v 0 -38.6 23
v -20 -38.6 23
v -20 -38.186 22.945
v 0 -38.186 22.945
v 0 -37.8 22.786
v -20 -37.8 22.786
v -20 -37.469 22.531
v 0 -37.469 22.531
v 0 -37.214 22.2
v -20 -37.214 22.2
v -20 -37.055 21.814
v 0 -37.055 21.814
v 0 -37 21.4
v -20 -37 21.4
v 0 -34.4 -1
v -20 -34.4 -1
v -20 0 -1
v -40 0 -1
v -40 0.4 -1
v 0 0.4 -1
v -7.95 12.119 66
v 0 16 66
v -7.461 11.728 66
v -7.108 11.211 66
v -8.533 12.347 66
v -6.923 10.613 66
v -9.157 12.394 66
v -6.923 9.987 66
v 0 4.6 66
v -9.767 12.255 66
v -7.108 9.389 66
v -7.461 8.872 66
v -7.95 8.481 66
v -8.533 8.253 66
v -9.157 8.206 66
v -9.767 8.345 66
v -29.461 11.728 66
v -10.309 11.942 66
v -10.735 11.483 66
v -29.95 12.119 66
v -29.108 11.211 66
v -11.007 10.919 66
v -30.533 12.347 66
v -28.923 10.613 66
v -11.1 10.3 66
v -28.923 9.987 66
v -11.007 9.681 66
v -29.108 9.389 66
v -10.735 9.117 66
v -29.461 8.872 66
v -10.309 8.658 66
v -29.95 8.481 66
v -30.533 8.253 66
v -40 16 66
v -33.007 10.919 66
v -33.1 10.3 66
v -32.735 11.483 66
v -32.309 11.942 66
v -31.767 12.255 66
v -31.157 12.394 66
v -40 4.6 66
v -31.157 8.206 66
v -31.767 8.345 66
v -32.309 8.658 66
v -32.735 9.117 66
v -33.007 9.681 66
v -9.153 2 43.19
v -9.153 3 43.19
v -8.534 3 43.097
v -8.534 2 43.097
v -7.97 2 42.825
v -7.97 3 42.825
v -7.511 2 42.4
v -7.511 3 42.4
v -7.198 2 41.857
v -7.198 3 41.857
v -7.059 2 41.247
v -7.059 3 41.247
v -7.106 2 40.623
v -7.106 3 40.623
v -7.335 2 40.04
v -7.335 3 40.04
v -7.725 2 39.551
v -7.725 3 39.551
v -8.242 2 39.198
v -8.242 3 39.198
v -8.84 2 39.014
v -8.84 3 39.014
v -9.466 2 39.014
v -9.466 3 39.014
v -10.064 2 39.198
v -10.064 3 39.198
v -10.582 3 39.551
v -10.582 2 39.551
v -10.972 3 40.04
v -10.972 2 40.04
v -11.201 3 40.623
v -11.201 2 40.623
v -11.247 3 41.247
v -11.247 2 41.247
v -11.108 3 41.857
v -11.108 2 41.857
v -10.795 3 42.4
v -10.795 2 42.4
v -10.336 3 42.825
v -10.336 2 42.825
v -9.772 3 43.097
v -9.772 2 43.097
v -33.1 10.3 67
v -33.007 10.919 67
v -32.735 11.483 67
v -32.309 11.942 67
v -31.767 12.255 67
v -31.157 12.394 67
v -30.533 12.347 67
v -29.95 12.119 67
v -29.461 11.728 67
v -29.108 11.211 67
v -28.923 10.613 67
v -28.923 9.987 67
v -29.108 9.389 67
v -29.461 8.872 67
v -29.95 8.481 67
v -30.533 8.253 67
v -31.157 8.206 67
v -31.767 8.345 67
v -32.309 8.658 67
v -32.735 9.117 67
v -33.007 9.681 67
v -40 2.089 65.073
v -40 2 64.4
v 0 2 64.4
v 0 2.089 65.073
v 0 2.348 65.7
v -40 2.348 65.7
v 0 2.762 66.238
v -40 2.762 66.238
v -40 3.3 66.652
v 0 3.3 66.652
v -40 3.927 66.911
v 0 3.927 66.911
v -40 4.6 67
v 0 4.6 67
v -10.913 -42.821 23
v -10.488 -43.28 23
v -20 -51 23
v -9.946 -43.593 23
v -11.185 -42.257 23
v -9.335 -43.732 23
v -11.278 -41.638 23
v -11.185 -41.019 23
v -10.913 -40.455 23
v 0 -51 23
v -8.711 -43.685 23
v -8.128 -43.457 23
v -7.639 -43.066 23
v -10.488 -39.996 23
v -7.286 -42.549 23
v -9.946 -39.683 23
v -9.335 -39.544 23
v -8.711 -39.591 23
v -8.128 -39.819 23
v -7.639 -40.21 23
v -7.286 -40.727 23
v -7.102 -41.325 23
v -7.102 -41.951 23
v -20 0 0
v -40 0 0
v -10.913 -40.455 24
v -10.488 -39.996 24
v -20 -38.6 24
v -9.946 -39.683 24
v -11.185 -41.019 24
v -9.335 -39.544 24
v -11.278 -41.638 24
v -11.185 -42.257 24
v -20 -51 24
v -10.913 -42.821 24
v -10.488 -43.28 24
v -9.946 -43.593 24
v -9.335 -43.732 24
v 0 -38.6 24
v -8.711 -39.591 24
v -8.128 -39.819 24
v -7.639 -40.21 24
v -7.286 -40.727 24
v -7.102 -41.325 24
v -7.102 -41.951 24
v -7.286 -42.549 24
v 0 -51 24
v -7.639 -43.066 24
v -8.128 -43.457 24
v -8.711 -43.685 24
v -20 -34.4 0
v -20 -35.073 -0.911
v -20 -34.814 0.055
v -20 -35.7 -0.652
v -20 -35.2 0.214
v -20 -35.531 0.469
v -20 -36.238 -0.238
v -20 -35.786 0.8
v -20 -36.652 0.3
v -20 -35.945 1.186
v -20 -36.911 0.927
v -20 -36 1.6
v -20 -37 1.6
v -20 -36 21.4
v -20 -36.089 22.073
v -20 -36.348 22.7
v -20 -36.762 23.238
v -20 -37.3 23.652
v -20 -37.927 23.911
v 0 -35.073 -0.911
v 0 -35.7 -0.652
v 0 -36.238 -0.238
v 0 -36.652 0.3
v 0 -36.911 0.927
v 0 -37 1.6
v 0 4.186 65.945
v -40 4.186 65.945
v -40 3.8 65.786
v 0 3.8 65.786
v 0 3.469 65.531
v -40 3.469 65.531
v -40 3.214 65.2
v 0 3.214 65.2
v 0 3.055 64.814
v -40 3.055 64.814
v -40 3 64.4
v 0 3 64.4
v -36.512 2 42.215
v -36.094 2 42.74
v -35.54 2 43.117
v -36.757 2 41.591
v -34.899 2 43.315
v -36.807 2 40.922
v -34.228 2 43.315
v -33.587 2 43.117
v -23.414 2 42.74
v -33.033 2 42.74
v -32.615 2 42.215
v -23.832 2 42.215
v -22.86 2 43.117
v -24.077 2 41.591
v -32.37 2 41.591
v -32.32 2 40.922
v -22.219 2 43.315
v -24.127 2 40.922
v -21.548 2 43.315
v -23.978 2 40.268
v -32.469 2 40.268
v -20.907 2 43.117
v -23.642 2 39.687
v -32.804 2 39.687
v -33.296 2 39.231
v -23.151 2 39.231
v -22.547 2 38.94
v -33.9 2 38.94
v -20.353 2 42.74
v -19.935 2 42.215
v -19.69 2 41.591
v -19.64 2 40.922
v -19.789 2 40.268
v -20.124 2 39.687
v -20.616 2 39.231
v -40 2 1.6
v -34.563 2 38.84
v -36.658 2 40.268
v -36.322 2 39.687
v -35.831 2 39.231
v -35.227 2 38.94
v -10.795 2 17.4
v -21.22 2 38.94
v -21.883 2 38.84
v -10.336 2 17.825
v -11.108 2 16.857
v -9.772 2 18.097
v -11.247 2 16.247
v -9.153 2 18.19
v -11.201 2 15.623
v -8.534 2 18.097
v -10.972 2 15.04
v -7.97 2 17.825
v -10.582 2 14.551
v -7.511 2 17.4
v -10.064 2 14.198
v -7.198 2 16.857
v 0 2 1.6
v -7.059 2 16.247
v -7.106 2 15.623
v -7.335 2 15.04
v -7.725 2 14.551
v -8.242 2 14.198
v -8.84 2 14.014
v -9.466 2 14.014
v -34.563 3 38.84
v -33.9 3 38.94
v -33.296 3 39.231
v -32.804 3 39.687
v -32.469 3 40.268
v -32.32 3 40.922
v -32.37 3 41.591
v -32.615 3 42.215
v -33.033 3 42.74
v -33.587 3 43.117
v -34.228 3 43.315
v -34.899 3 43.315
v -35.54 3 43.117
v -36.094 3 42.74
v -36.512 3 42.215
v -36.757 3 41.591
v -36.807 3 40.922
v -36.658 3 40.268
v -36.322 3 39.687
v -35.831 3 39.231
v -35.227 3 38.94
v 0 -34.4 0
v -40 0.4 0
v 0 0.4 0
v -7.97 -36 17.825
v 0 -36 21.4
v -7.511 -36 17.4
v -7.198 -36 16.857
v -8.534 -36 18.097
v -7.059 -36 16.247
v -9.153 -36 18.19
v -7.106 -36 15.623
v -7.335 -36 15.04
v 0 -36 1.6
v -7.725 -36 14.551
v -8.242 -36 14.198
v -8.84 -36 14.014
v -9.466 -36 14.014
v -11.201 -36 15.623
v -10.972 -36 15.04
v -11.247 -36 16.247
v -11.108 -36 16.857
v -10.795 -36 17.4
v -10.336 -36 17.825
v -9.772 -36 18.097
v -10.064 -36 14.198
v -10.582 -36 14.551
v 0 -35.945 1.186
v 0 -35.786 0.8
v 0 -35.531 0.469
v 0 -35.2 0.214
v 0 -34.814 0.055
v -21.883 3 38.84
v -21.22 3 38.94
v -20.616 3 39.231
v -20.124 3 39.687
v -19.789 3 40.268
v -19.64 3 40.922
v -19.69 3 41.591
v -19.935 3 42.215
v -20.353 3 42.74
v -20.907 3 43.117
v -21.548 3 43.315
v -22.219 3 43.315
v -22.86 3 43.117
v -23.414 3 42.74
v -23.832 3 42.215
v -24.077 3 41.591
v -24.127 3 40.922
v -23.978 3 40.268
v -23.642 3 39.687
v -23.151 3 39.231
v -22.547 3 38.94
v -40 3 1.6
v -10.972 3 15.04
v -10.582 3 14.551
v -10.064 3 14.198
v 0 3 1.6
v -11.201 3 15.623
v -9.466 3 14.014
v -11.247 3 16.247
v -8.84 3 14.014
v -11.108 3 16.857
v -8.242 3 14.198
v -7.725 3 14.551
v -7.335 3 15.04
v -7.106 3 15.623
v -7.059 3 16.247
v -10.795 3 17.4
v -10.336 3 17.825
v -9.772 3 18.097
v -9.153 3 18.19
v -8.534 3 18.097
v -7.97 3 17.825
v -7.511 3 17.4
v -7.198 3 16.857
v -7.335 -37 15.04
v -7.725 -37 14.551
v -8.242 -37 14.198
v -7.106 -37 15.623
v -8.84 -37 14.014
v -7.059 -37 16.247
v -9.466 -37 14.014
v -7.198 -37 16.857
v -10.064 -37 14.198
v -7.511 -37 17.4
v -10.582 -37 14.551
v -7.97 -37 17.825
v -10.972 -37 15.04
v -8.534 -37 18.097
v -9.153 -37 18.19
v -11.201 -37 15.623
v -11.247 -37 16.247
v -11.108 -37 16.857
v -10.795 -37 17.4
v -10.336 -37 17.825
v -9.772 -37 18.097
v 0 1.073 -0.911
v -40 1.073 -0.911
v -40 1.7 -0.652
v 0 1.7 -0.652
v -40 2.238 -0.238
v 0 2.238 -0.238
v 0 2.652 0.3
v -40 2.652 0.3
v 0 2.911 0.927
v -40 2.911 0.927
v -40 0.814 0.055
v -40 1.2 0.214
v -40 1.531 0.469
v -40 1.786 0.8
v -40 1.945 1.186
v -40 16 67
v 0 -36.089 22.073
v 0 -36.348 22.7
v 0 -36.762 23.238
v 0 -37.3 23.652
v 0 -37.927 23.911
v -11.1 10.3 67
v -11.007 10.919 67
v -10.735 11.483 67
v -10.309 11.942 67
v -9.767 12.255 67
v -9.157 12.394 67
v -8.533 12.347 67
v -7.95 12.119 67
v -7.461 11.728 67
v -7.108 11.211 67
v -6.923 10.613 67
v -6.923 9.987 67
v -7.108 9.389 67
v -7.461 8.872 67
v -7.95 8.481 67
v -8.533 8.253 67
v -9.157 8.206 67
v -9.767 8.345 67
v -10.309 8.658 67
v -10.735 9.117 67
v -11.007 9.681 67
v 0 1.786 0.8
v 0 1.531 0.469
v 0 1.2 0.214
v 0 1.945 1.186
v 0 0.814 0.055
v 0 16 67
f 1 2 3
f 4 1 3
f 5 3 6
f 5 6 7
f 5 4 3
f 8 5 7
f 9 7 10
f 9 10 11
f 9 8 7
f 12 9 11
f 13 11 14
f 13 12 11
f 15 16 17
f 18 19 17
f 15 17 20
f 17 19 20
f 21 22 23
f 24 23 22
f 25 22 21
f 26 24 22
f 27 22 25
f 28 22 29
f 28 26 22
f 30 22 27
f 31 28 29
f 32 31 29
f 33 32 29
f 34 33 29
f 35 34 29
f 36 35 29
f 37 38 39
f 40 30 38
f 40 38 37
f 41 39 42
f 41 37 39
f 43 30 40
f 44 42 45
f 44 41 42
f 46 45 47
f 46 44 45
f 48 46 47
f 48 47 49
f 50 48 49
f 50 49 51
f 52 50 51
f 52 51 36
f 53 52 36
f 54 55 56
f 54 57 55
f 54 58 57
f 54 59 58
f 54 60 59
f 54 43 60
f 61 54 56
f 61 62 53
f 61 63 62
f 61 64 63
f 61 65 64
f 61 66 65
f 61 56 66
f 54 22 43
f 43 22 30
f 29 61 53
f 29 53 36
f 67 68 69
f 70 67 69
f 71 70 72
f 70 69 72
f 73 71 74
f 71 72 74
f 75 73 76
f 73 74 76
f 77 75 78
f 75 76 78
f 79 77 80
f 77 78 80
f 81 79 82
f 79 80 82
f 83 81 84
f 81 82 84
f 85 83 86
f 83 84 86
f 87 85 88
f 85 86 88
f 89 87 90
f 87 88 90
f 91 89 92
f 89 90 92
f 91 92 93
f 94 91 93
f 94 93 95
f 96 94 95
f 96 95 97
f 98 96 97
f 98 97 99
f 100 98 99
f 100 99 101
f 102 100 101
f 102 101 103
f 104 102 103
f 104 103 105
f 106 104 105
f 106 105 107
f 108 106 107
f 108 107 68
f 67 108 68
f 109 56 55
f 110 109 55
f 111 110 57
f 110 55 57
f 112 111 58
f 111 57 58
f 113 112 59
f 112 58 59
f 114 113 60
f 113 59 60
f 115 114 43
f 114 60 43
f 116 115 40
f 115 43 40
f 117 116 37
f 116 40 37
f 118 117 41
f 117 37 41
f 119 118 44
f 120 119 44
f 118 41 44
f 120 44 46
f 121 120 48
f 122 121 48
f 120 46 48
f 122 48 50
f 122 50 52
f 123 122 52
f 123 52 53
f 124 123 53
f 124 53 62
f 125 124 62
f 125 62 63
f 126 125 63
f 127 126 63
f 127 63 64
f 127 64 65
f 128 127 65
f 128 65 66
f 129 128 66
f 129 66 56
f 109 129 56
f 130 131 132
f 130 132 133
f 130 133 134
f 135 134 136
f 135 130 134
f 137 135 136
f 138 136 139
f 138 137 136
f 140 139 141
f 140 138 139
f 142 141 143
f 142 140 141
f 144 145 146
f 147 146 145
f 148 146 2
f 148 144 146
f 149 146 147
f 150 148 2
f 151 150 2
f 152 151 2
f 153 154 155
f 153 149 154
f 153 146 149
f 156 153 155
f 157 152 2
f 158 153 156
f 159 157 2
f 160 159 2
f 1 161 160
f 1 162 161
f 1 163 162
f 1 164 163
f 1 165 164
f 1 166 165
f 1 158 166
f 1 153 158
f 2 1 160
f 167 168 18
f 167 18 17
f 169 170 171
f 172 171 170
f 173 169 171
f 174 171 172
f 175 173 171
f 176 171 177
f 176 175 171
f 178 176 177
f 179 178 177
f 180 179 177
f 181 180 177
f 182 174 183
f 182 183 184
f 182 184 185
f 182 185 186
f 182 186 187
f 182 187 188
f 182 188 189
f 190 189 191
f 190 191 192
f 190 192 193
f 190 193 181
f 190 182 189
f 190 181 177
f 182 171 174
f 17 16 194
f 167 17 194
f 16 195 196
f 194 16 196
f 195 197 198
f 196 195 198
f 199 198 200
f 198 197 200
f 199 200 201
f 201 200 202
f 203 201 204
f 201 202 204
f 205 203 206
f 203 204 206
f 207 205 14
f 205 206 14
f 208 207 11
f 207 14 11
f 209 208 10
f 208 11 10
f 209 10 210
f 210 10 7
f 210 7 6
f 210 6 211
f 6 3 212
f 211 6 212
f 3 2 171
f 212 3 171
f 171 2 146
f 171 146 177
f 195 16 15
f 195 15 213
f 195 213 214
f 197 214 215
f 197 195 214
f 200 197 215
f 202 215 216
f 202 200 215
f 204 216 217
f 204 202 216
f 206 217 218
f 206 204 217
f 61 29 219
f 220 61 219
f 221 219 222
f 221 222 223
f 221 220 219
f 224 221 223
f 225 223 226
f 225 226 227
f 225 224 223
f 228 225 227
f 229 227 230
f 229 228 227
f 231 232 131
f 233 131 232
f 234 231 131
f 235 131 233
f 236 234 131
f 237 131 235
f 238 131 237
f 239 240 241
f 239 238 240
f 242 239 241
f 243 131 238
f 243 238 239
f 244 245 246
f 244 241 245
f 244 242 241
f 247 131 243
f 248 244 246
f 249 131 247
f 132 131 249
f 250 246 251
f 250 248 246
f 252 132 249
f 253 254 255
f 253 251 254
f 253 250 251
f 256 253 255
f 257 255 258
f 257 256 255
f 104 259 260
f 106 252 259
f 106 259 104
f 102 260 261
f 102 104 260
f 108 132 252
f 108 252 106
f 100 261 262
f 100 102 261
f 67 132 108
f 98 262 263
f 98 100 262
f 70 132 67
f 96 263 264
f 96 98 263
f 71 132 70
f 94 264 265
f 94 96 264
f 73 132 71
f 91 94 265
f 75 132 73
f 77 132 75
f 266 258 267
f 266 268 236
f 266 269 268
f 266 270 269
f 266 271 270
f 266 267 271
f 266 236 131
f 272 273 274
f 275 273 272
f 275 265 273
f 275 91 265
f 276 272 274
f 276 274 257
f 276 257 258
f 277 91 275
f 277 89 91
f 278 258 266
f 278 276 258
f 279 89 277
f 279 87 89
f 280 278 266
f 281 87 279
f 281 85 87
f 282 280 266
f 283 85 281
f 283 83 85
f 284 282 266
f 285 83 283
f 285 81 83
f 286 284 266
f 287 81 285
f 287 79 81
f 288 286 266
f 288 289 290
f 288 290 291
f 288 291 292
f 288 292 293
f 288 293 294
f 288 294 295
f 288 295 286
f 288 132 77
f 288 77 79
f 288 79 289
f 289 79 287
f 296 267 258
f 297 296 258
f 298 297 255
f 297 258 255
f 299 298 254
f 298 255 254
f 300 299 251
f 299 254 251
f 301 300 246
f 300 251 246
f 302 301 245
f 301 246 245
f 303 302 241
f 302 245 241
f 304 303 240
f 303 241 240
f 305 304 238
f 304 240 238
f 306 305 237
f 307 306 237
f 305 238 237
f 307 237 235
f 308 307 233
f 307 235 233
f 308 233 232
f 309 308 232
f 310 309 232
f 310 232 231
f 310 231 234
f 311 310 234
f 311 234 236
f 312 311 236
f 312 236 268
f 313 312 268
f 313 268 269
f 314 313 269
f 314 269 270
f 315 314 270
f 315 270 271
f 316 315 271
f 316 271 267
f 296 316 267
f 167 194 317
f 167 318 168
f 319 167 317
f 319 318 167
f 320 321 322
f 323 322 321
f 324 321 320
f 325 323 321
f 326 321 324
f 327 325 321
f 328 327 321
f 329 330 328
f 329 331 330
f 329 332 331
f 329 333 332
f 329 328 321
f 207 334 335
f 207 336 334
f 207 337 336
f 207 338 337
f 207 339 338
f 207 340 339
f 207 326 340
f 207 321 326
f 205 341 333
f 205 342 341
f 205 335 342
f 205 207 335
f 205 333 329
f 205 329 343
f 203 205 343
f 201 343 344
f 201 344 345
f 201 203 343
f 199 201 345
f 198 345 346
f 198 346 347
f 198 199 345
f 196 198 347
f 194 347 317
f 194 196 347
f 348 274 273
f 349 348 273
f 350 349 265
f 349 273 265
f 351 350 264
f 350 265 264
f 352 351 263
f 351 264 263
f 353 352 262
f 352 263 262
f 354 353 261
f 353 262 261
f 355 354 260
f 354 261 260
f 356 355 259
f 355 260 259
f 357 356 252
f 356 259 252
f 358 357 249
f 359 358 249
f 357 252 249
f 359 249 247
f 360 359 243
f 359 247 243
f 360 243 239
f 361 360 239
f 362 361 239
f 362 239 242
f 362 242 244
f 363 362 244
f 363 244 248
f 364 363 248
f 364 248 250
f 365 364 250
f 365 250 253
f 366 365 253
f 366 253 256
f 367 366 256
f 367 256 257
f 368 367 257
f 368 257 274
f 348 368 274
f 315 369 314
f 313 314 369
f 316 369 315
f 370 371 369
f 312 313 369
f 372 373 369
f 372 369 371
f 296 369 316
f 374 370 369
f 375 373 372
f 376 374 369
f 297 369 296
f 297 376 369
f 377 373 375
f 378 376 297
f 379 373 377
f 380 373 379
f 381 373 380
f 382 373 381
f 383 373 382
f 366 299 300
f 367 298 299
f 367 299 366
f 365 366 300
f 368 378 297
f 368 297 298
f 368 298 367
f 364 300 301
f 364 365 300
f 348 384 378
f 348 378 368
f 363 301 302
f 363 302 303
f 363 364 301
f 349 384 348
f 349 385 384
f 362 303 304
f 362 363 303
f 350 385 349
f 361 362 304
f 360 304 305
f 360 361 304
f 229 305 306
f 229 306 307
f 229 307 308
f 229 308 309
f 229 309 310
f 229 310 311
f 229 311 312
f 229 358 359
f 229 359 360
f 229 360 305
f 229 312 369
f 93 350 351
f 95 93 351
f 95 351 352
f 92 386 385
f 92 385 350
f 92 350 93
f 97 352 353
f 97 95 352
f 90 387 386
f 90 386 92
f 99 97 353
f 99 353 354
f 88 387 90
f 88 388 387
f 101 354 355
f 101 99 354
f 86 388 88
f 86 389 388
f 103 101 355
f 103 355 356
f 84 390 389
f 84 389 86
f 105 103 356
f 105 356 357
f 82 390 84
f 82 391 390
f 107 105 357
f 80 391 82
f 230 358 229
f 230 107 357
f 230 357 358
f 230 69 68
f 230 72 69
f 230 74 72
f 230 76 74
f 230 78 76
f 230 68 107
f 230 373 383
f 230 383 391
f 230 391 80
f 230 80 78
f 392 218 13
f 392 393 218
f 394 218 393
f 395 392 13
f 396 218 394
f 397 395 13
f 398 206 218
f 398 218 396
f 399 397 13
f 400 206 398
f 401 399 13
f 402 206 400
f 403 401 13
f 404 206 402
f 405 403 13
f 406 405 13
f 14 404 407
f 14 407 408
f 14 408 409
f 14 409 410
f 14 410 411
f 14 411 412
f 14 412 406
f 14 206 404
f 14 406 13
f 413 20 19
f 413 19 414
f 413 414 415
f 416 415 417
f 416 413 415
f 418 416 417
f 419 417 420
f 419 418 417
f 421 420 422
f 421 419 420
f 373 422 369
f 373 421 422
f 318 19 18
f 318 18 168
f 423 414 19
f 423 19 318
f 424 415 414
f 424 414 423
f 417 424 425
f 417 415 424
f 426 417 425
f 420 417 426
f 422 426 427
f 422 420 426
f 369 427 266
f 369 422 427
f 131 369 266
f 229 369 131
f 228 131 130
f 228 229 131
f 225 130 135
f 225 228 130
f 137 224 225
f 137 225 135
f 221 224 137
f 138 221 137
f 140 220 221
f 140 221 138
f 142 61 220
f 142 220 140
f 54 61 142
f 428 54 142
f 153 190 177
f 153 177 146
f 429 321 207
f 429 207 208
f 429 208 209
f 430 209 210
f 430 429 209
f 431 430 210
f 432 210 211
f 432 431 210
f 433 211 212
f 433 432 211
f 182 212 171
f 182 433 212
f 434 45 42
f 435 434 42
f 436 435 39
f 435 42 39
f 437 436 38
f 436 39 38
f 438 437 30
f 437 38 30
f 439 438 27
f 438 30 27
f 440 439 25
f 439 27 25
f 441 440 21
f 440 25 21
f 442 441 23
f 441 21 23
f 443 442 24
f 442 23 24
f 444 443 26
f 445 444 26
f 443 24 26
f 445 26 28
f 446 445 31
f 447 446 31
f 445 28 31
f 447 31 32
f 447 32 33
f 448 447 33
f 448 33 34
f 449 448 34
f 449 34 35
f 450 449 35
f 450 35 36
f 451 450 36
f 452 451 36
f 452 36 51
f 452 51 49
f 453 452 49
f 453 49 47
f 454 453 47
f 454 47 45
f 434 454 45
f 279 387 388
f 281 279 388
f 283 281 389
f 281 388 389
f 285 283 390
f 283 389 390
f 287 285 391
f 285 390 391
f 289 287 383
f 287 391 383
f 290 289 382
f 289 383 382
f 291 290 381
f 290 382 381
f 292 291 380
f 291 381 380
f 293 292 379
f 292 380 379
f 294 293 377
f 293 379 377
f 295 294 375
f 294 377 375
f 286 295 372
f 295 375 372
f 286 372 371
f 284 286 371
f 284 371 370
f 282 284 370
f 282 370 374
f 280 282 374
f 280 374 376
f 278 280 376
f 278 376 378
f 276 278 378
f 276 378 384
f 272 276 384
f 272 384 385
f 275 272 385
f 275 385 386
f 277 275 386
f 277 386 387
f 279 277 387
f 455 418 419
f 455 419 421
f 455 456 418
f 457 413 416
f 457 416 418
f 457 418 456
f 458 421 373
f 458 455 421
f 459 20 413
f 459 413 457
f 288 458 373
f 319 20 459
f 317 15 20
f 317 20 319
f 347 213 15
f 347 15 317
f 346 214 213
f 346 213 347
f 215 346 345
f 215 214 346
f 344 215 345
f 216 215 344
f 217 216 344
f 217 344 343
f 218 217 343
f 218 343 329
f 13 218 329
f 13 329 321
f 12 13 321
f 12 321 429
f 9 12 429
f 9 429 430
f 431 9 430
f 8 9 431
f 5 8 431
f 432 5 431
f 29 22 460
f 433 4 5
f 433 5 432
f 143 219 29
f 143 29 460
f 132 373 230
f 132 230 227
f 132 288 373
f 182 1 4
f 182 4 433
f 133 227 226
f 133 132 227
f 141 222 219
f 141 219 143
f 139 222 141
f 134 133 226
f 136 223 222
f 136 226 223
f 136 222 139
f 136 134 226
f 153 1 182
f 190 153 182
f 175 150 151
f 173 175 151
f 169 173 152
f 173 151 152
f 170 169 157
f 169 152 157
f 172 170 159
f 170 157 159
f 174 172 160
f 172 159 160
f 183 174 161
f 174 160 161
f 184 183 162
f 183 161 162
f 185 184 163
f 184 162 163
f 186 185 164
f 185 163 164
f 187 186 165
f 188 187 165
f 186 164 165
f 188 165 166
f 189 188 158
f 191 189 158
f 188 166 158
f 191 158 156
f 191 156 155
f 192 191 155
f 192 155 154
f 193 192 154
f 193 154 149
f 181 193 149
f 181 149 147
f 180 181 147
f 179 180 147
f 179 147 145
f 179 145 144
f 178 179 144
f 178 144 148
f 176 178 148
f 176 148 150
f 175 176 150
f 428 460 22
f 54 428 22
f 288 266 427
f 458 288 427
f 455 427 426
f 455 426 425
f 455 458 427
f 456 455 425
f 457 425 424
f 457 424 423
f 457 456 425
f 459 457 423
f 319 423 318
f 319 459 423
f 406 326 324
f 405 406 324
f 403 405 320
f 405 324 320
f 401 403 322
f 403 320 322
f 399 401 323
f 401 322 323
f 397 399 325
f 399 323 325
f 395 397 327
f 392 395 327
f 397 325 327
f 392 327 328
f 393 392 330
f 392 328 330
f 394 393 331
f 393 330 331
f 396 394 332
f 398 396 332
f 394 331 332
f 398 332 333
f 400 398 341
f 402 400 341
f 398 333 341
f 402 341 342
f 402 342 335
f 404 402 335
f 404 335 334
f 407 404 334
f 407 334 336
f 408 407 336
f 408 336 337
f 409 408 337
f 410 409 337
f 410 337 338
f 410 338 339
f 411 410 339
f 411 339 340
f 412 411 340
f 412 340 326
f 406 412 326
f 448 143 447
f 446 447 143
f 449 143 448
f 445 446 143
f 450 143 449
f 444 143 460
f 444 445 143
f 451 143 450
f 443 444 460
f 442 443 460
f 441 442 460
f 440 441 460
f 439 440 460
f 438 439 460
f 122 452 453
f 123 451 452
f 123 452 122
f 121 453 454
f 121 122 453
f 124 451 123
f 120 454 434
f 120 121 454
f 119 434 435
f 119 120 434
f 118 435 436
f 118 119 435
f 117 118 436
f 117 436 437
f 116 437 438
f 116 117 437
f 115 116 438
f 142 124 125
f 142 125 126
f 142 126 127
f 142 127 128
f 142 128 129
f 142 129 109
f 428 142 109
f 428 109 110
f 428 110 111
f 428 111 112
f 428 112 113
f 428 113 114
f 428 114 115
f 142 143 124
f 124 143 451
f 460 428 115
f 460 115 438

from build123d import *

# Parameters (mm, degrees)
BASE_FLANGE1_DEPTH           = 1
EDGE_FLANGE1_STRIP_W         = 7.2
EDGE_FLANGE1_STRIP_H         = 1
EDGE_FLANGE1_STRIP_CUT_DEPTH = 40
EDGE_FLANGE1_DEPTH           = 40
EDGE_FLANGE2_STRIP_W         = 7.2
EDGE_FLANGE2_STRIP_H         = 1
EDGE_FLANGE2_STRIP_CUT_DEPTH = 40
EDGE_FLANGE2_DEPTH           = 40
EDGE_FLANGE3_STRIP_W         = 7.2
EDGE_FLANGE3_STRIP_H         = 1
EDGE_FLANGE3_STRIP_CUT_DEPTH = 20
EDGE_FLANGE3_DEPTH           = 20
EDGE_FLANGE4_STRIP_W         = 7.2
EDGE_FLANGE4_STRIP_H         = 1
EDGE_FLANGE4_STRIP_CUT_DEPTH = 20
EDGE_FLANGE4_DEPTH           = 20
SKETCH18_R                   = 2.1
CUT_EXTRUDE1_DEPTH           = 6
SKETCH19_R                   = 2.1
CUT_EXTRUDE2_DEPTH           = 6
SKETCH20_R                   = 2.1
CUT_EXTRUDE3_DEPTH           = 50
SKETCH21_R                   = 2.25
CUT_EXTRUDE4_DEPTH           = 50


# Sheet-metal steps are written as plain solids
with BuildPart() as part:
    # Sketch1 → Base-Flange1 (new body)
    with BuildSketch(Plane.XY):
        Polygon((0, 0), (0, 3), (-40, 3), (-40, 0), (-20, 0), (-20, -37), (-18.16511543, -37), (0, -37), align=None)
    extrude(amount=-BASE_FLANGE1_DEPTH)

    # Edge-Flange1 strip (across the edge) → Edge-Flange1 strip cut (cut)
    with BuildSketch(Plane(origin=(0, 3, 0), x_dir=(0, -1, 0), z_dir=(-1, 0, 0))):
        with Locations((-1, -0.5)):
            Rectangle(EDGE_FLANGE1_STRIP_W, EDGE_FLANGE1_STRIP_H)
    extrude(amount=EDGE_FLANGE1_STRIP_CUT_DEPTH, mode=Mode.SUBTRACT)

    # Edge-Flange1 section (across the edge) → Edge-Flange1 (add)
    with BuildSketch(Plane(origin=(0, 3, 0), x_dir=(0, -1, 0), z_dir=(-1, 0, 0))):
        with BuildLine():
            Line((0, 1.6), (0, 67))
            Line((0, 67), (1, 67))
            Line((1, 67), (1, 1.6))
            ThreePointArc((1, 1.6), (1.46862915, 0.46862915), (2.6, 0))
            Line((2.6, 0), (2.6, -1))
            ThreePointArc((2.6, -1), (0.761522369, -0.238477631), (0, 1.6))
        make_face()
    extrude(amount=EDGE_FLANGE1_DEPTH)

    # Edge-Flange2 strip (across the edge) → Edge-Flange2 strip cut (cut)
    with BuildSketch(Plane(origin=(-40, 3, 67), x_dir=(0, 0, -1), z_dir=(1, 0, 0))):
        with Locations((-1, -0.5)):
            Rectangle(EDGE_FLANGE2_STRIP_W, EDGE_FLANGE2_STRIP_H)
    extrude(amount=EDGE_FLANGE2_STRIP_CUT_DEPTH, mode=Mode.SUBTRACT)

    # Edge-Flange2 section (across the edge) → Edge-Flange2 (add)
    with BuildSketch(Plane(origin=(-40, 3, 67), x_dir=(0, 0, -1), z_dir=(1, 0, 0))):
        with BuildLine():
            Line((0, 1.6), (0, 13))
            Line((0, 13), (1, 13))
            Line((1, 13), (1, 1.6))
            ThreePointArc((1, 1.6), (1.46862915, 0.46862915), (2.6, 0))
            Line((2.6, 0), (2.6, -1))
            ThreePointArc((2.6, -1), (0.761522369, -0.238477631), (0, 1.6))
        make_face()
    extrude(amount=EDGE_FLANGE2_DEPTH)

    # Edge-Flange3 strip (across the edge) → Edge-Flange3 strip cut (cut)
    with BuildSketch(Plane(origin=(-20, -37, 0), x_dir=(0, 1, 0), z_dir=(1, 0, 0))):
        with Locations((-1, -0.5)):
            Rectangle(EDGE_FLANGE3_STRIP_W, EDGE_FLANGE3_STRIP_H)
    extrude(amount=EDGE_FLANGE3_STRIP_CUT_DEPTH, mode=Mode.SUBTRACT)

    # Edge-Flange3 section (across the edge) → Edge-Flange3 (add)
    with BuildSketch(Plane(origin=(-20, -37, 0), x_dir=(0, 1, 0), z_dir=(1, 0, 0))):
        with BuildLine():
            Line((0, 1.6), (0, 24))
            Line((0, 24), (1, 24))
            Line((1, 24), (1, 1.6))
            ThreePointArc((1, 1.6), (1.46862915, 0.46862915), (2.6, 0))
            Line((2.6, 0), (2.6, -1))
            ThreePointArc((2.6, -1), (0.761522369, -0.238477631), (0, 1.6))
        make_face()
    extrude(amount=EDGE_FLANGE3_DEPTH)

    # Edge-Flange4 strip (across the edge) → Edge-Flange4 strip cut (cut)
    with BuildSketch(Plane(origin=(0, -37, 24), x_dir=(0, 0, -1), z_dir=(-1, 0, 0))):
        with Locations((-1, -0.5)):
            Rectangle(EDGE_FLANGE4_STRIP_W, EDGE_FLANGE4_STRIP_H)
    extrude(amount=EDGE_FLANGE4_STRIP_CUT_DEPTH, mode=Mode.SUBTRACT)

    # Edge-Flange4 section (across the edge) → Edge-Flange4 (add)
    with BuildSketch(Plane(origin=(0, -37, 24), x_dir=(0, 0, -1), z_dir=(-1, 0, 0))):
        with BuildLine():
            Line((0, 1.6), (0, 14))
            Line((0, 14), (1, 14))
            Line((1, 14), (1, 1.6))
            ThreePointArc((1, 1.6), (1.46862915, 0.46862915), (2.6, 0))
            Line((2.6, 0), (2.6, -1))
            ThreePointArc((2.6, -1), (0.761522369, -0.238477631), (0, 1.6))
        make_face()
    extrude(amount=EDGE_FLANGE4_DEPTH)

    # Sketch18 → Cut-Extrude1 (cut)
    with BuildSketch(Plane(origin=(0, 0, 66), x_dir=(-1, 0, 0), z_dir=(0, 0, -1))):
        with Locations((9, 10.3)):
            Circle(SKETCH18_R)
        with Locations((31, 10.3)):
            Circle(SKETCH18_R)
    extrude(amount=-CUT_EXTRUDE1_DEPTH, mode=Mode.SUBTRACT)

    # Sketch19 → Cut-Extrude2 (cut)
    with BuildSketch(Plane(origin=(0, 0, 23), x_dir=(-1, 0, 0), z_dir=(0, 0, -1))):
        with Locations((9.178318955, -41.637901039)):
            Circle(SKETCH19_R)
    extrude(amount=-CUT_EXTRUDE2_DEPTH, mode=Mode.SUBTRACT)

    # Sketch20 → Cut-Extrude3 (cut)
    with BuildSketch(Plane(origin=(0, 3, 0), x_dir=(1, 0, 0), z_dir=(0, 1, 0))):
        with Locations(Location((-9.153318955, -41.090231637, 0), (0, 0, 270))):
            Circle(SKETCH20_R)
        with Locations(Location((-9.153318955, -16.090231637, 0), (0, 0, 270))):
            Circle(SKETCH20_R)
    extrude(amount=-CUT_EXTRUDE3_DEPTH, mode=Mode.SUBTRACT)

    # Sketch21 → Cut-Extrude4 (cut)
    with BuildSketch(Plane.XZ.offset(-2)):
        with Locations(Location((-21.883318955, 41.090231637, 0), (0, 0, 270))):
            Circle(SKETCH21_R)
        with Locations(Location((-34.563318955, 41.090231637, 0), (0, 0, 270))):
            Circle(SKETCH21_R)
    extrude(amount=-CUT_EXTRUDE4_DEPTH, mode=Mode.SUBTRACT)


solid = part.part
